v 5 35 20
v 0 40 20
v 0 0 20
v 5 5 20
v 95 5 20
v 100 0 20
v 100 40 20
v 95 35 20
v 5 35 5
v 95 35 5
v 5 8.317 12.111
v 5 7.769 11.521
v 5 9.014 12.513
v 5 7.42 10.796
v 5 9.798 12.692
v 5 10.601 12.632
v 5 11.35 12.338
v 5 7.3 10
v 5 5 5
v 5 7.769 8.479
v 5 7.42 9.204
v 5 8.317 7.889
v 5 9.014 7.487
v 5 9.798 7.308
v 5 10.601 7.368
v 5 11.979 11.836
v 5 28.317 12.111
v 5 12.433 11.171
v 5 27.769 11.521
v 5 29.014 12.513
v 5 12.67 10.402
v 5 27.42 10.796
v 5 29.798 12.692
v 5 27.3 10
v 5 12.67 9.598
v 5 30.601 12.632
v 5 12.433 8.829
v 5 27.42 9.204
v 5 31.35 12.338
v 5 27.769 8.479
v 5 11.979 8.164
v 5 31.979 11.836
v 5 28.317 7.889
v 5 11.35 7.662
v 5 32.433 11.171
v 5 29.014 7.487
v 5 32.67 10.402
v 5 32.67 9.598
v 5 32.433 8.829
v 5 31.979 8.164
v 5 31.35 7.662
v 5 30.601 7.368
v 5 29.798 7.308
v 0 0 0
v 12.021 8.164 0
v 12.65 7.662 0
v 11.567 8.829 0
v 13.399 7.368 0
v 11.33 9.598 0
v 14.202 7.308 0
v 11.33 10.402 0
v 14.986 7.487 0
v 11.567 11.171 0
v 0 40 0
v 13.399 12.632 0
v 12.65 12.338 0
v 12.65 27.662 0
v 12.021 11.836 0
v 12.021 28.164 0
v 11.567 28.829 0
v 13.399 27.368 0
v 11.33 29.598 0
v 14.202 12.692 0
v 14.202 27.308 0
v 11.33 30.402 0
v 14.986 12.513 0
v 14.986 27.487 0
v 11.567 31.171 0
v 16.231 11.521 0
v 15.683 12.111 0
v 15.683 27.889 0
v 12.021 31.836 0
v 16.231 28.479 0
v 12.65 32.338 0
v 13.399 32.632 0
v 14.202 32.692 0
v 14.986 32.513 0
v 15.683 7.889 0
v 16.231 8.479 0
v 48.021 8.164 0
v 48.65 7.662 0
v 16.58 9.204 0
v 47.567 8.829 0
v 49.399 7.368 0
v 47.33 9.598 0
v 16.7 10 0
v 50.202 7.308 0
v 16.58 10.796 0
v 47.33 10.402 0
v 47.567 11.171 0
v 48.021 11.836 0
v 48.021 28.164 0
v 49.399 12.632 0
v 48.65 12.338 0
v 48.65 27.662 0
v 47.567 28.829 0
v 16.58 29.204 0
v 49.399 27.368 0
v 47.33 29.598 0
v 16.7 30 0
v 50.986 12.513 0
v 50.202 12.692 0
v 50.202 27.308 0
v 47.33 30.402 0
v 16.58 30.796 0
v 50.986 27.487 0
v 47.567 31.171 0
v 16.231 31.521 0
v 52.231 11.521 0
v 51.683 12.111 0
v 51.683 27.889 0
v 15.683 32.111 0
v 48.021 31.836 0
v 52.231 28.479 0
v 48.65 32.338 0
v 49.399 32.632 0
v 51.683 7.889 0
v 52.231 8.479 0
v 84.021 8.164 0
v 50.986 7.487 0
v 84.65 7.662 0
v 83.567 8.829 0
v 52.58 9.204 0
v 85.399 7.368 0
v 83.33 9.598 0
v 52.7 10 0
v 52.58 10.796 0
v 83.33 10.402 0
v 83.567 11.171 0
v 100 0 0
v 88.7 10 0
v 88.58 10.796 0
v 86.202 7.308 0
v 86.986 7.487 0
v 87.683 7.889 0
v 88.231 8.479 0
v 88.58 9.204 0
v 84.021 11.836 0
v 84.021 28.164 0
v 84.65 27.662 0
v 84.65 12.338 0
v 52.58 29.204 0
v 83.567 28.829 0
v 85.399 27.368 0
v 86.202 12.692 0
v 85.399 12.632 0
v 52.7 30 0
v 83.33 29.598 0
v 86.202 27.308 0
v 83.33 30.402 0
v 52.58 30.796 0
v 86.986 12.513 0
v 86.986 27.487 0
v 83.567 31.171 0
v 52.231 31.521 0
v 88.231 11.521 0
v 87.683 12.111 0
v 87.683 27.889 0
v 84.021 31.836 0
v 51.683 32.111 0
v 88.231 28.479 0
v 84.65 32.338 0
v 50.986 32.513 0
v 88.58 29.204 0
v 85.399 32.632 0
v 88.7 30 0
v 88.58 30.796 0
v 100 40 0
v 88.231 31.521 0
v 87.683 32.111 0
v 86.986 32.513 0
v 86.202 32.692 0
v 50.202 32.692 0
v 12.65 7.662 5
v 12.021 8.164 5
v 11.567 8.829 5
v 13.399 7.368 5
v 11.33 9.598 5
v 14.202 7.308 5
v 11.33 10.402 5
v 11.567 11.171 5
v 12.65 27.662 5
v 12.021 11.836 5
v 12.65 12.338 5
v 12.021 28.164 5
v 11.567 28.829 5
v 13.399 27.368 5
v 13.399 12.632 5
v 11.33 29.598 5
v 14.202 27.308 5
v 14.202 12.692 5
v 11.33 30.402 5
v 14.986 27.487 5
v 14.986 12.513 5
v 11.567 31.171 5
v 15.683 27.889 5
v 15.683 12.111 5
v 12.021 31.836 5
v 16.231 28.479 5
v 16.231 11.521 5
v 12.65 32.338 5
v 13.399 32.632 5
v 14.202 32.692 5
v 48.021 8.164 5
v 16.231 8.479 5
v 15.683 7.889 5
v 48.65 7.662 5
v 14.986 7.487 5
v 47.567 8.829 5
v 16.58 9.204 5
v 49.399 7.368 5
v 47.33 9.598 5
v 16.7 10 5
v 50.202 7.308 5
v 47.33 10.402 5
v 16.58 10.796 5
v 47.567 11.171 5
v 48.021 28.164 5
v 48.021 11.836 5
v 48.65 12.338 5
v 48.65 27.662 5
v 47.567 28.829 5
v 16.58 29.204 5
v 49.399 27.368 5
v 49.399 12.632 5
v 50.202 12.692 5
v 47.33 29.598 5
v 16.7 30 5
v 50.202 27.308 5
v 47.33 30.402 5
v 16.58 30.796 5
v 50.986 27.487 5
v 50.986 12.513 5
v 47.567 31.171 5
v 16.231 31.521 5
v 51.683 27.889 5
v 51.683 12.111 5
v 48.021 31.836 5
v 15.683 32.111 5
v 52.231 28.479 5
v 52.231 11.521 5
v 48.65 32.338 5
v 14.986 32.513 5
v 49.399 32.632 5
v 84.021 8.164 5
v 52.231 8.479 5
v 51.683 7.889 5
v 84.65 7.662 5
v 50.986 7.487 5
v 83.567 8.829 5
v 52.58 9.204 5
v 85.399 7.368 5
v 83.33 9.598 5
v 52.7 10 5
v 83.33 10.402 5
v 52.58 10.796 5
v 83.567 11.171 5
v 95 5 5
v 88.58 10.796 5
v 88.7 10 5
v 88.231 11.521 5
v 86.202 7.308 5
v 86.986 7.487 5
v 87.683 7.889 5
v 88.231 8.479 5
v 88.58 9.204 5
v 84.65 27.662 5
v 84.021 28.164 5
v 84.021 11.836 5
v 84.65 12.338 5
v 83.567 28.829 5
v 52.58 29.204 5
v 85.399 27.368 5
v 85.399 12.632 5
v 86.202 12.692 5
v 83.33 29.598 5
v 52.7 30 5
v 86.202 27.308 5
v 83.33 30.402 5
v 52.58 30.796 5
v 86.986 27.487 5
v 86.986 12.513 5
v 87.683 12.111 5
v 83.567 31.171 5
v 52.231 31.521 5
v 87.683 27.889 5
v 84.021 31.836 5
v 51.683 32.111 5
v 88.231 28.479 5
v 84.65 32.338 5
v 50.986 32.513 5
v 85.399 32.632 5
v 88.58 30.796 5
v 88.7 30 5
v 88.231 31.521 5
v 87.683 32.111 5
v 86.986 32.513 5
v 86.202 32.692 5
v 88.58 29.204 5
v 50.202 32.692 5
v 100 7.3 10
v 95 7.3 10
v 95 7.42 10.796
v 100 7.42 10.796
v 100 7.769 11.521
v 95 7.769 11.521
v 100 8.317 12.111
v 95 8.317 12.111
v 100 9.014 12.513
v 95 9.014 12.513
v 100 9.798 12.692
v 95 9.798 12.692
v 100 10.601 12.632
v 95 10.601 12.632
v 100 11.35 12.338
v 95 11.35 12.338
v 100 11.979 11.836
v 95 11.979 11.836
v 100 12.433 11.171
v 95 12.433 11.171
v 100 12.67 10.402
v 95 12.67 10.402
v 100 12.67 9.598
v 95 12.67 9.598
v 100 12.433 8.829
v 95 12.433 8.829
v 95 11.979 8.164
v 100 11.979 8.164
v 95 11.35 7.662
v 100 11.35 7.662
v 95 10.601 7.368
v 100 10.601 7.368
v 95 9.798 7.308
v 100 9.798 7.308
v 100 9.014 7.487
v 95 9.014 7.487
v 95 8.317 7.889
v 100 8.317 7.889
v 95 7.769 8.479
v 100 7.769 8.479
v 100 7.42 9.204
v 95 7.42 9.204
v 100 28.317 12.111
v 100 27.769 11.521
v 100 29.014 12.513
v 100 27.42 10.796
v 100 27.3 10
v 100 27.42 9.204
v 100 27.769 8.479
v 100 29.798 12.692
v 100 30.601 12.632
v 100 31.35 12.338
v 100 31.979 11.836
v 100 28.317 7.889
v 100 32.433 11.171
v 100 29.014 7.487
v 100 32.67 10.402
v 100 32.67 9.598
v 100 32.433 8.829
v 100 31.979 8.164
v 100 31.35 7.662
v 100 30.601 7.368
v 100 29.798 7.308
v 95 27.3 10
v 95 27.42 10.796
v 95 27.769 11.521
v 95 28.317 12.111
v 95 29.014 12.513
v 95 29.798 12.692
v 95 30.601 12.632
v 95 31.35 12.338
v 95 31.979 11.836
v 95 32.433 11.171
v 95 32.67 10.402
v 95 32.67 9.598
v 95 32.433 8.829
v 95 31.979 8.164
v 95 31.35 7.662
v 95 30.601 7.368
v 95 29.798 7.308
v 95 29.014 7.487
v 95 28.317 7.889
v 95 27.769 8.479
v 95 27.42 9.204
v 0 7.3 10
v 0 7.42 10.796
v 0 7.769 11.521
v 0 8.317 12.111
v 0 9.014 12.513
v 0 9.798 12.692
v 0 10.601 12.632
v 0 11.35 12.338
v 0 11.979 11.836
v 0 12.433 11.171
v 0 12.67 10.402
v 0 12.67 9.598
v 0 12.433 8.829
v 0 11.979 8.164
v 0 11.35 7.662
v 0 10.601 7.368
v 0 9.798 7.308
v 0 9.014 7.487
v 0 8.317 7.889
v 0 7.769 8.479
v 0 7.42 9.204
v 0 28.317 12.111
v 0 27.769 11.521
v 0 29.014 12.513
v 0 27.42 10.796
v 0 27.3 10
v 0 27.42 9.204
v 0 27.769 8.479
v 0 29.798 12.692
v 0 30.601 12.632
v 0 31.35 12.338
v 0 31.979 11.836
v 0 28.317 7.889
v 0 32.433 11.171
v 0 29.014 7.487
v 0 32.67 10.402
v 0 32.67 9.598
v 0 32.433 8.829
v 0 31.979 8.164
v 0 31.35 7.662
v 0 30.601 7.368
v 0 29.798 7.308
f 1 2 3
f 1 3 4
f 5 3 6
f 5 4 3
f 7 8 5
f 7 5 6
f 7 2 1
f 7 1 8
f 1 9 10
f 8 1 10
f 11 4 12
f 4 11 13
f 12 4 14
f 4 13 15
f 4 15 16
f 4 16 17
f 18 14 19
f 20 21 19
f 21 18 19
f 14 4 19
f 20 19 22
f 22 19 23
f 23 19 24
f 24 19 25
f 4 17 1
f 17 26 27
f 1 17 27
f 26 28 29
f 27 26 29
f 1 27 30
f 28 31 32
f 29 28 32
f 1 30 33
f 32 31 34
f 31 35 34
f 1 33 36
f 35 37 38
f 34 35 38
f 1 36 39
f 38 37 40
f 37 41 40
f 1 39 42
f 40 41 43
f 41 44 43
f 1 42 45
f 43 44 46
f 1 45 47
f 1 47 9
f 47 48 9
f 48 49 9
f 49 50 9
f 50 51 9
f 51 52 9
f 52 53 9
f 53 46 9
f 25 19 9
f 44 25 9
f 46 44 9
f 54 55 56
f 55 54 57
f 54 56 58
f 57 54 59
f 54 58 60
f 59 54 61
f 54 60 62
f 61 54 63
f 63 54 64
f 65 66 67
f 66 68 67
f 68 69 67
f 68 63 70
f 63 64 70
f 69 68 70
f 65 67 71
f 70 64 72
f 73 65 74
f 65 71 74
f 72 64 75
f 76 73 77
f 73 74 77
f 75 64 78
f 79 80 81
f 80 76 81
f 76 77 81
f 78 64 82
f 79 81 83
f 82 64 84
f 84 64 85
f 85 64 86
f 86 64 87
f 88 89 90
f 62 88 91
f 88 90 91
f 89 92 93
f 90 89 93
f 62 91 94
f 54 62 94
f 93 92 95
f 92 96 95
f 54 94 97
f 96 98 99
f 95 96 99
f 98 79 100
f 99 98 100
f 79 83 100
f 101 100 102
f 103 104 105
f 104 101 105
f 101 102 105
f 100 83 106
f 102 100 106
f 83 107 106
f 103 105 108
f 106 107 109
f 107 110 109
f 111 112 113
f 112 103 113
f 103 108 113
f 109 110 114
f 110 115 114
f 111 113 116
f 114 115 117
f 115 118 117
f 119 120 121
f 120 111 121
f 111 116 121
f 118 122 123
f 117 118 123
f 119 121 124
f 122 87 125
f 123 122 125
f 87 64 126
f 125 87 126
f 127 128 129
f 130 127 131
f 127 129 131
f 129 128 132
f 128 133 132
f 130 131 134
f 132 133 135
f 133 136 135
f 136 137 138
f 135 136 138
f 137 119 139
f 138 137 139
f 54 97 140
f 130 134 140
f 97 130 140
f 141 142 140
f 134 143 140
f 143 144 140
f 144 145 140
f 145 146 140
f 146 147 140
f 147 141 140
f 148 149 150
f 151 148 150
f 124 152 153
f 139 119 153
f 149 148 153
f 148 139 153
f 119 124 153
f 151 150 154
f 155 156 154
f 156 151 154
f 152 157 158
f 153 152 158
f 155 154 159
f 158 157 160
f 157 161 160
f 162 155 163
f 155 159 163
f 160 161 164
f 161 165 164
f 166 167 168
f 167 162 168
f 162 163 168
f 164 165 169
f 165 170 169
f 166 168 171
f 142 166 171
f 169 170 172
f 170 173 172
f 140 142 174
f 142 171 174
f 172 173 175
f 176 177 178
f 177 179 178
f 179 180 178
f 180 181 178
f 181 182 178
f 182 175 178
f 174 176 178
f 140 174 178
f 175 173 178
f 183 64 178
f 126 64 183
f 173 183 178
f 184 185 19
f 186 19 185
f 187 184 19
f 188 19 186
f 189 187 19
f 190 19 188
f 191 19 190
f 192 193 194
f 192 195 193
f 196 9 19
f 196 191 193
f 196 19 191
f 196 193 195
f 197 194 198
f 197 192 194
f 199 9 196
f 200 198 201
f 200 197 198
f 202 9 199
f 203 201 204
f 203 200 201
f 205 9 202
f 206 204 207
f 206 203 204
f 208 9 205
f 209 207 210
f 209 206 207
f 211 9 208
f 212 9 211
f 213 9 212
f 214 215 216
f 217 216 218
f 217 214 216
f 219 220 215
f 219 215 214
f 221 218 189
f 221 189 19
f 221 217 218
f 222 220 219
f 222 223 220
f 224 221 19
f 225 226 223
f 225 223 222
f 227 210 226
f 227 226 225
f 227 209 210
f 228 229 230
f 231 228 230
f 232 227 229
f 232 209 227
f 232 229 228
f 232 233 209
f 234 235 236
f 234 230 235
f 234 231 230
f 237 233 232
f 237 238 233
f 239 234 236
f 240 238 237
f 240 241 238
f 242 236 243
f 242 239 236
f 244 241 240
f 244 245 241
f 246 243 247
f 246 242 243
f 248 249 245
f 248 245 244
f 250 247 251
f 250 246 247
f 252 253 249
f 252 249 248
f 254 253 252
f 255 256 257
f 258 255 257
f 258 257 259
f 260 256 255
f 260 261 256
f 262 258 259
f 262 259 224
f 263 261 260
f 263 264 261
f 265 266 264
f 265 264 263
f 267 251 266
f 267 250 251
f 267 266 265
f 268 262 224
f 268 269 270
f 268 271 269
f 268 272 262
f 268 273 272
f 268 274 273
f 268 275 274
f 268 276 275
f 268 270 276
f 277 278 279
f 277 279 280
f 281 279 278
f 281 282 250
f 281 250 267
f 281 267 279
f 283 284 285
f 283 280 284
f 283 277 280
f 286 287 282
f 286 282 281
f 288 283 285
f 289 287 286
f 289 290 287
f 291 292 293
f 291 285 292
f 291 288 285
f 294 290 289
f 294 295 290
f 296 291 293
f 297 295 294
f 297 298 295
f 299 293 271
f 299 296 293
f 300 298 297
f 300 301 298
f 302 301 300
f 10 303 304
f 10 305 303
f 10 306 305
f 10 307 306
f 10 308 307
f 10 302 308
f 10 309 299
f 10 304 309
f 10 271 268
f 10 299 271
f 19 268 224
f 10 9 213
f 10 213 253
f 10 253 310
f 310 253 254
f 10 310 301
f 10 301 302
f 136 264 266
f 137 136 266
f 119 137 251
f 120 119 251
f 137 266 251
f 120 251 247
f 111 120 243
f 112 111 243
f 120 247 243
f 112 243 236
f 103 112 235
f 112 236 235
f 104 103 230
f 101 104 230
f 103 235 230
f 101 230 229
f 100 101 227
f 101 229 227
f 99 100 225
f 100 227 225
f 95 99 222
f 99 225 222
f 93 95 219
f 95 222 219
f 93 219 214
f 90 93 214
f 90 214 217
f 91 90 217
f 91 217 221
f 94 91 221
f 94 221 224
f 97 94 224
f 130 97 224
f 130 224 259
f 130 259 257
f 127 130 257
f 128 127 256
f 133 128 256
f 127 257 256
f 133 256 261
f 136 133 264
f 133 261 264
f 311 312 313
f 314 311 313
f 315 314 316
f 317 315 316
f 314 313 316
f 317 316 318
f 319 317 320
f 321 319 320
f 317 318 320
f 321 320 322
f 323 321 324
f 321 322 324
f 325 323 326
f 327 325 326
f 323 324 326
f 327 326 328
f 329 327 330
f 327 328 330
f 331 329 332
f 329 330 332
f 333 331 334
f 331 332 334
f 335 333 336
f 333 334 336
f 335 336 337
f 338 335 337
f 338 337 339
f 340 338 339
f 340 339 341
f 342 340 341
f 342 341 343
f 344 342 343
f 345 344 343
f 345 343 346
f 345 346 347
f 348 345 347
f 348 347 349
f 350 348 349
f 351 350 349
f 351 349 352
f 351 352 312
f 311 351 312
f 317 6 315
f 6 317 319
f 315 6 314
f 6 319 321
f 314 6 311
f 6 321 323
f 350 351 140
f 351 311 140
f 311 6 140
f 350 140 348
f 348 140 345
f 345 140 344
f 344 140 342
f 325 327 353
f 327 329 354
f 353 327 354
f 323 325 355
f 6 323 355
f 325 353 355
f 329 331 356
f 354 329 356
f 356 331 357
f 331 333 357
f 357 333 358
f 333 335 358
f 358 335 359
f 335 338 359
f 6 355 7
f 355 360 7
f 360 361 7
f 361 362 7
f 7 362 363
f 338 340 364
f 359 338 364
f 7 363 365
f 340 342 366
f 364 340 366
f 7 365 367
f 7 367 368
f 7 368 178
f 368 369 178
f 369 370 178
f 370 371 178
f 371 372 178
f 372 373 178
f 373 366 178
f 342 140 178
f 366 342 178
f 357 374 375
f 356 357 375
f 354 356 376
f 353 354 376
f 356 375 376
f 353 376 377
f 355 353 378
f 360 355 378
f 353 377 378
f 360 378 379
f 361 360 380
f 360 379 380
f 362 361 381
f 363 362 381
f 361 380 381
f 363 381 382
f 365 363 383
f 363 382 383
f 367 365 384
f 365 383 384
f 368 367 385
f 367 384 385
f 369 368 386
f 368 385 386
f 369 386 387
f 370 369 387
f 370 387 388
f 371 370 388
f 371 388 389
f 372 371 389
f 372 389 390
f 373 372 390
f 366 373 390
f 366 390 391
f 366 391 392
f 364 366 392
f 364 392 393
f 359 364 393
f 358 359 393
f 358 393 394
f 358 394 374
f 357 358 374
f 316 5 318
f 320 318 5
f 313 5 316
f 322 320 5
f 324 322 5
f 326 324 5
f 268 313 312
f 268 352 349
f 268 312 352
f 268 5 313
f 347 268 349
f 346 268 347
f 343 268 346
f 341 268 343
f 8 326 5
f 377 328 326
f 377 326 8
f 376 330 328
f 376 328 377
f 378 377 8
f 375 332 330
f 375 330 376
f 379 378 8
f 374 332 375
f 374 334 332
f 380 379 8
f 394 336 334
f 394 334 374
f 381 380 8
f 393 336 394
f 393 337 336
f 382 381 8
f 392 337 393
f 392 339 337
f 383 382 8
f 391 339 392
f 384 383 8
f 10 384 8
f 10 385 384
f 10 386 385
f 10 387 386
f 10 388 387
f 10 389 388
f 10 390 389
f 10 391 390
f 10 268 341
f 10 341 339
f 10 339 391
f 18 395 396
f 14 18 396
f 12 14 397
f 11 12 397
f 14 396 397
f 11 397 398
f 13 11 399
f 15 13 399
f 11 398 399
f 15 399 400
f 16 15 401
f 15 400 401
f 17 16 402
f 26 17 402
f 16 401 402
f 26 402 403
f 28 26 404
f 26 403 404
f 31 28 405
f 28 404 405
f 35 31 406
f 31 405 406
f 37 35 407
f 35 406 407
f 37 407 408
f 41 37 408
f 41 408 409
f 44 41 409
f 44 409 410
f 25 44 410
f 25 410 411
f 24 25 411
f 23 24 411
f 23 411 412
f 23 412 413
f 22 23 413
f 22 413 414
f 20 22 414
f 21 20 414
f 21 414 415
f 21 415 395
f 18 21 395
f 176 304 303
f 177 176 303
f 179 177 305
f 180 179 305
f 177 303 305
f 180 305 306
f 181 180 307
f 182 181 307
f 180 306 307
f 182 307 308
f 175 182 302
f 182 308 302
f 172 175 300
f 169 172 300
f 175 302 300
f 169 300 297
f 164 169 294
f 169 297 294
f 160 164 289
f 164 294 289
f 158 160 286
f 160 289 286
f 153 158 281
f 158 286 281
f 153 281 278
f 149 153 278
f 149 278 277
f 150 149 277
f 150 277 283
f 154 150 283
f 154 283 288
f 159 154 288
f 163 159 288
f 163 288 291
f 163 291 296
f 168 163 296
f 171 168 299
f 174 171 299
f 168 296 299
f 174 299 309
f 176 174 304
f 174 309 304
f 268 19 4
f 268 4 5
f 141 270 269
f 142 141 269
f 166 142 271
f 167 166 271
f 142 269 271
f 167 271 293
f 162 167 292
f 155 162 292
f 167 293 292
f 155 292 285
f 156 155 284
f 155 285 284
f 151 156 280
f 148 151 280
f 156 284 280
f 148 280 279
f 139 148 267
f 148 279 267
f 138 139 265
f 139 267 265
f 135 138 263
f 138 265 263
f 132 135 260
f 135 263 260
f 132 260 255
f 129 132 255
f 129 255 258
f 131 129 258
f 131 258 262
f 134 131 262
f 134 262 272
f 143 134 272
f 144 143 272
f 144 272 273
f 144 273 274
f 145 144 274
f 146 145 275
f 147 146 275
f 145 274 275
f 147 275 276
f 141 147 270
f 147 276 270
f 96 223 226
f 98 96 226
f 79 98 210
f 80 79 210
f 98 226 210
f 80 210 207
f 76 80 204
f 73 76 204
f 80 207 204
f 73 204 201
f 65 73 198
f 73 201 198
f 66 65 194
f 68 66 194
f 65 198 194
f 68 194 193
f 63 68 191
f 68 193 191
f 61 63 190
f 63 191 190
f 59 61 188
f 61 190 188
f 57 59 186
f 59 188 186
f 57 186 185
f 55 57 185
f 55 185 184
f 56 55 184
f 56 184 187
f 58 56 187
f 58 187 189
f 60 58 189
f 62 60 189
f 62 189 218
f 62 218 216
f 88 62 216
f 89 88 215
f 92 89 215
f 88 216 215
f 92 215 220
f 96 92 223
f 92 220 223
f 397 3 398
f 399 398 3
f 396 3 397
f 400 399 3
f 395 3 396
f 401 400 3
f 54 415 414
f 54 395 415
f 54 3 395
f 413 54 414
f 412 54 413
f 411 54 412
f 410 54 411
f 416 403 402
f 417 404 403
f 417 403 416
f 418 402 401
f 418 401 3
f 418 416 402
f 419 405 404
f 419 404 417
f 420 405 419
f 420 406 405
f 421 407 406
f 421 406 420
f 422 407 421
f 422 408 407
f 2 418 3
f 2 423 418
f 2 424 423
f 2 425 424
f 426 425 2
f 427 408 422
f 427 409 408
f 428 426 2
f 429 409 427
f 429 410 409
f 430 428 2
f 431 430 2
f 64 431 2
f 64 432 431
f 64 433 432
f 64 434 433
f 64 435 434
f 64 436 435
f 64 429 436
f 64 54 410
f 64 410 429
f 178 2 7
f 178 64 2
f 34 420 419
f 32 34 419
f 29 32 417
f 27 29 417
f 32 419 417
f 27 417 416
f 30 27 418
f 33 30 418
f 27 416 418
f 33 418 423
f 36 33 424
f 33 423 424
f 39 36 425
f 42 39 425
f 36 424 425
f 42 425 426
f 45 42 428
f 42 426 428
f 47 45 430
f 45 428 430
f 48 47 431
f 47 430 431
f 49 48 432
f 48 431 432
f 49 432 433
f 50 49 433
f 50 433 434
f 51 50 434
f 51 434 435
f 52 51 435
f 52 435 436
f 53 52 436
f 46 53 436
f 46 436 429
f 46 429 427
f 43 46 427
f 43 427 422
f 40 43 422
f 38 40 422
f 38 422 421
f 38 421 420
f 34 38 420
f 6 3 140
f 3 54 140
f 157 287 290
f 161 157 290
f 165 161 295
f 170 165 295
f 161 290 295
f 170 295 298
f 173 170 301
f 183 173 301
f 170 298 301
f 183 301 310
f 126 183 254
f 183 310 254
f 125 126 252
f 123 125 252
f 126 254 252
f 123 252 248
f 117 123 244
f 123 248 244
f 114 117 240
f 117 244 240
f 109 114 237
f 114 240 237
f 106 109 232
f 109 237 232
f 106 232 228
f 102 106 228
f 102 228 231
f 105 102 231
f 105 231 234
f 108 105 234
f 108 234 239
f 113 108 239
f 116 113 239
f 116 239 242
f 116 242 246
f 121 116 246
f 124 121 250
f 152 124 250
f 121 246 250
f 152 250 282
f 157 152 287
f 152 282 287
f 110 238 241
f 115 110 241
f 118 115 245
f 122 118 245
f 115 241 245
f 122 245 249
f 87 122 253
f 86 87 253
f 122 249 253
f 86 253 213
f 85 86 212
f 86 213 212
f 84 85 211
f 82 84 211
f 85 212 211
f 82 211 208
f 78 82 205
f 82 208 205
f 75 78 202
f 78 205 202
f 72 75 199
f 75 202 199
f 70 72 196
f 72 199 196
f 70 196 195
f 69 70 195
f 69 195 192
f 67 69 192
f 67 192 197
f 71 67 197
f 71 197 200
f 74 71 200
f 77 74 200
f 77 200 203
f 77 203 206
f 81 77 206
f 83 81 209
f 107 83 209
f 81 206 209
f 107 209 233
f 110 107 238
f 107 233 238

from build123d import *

# Parameters (mm, degrees)
SKETCH079_W     = 100
SKETCH079_H     = 40
PAD064_DEPTH    = 5
SKETCH080_W     = 5
SKETCH080_H     = 40
PAD065_DEPTH    = 15
SKETCH081_R     = 2.7
POCKET019_DEPTH = 100.001
SKETCH082_R     = 2.7
POCKET020_DEPTH = 5
SKETCH089_W     = 90
SKETCH089_H     = 5
PAD072_DEPTH    = 15


with BuildPart() as part:
    # Sketch079 → Pad064 (new body)
    with BuildSketch(Plane.XY):
        with Locations((50, 20)):
            Rectangle(SKETCH079_W, SKETCH079_H)
    extrude(amount=PAD064_DEPTH)

    # Sketch080 (on Face6 of Pad064) → Pad065 (join)
    with BuildSketch(Plane.XY.offset(5)):
        with Locations((2.5, 20)):
            Rectangle(SKETCH080_W, SKETCH080_H)
        with Locations((97.5, 20)):
            Rectangle(SKETCH080_W, SKETCH080_H)
    extrude(amount=PAD065_DEPTH)

    # Sketch081 (on Face5 of Pad065) → Pocket019 (cut, through all)
    with BuildSketch(Plane(origin=(0, 0, 0), x_dir=(0, -1, 0), z_dir=(-1, 0, 0))):
        with Locations((-30, 10)):
            Circle(SKETCH081_R)
        with Locations((-10, 10)):
            Circle(SKETCH081_R)
    extrude(amount=-POCKET019_DEPTH, mode=Mode.SUBTRACT)

    # Sketch082 (on Face8 of Pocket019) → Pocket020 (cut)
    with BuildSketch(Plane.XY.offset(5)):
        with Locations((14, 30)):
            Circle(SKETCH082_R)
        with Locations((14, 10)):
            Circle(SKETCH082_R)
        with Locations((86, 30)):
            Circle(SKETCH082_R)
        with Locations((86, 10)):
            Circle(SKETCH082_R)
        with Locations((50, 30)):
            Circle(SKETCH082_R)
        with Locations((50, 10)):
            Circle(SKETCH082_R)
    extrude(amount=-POCKET020_DEPTH, mode=Mode.SUBTRACT)

    # Sketch089 (on Face8 of Pocket020) → Pad072 (join)
    with BuildSketch(Plane.XY.offset(5)):
        with Locations((50, 37.5)):
            Rectangle(SKETCH089_W, SKETCH089_H)
        with Locations((50, 2.5)):
            Rectangle(SKETCH089_W, SKETCH089_H)
    extrude(amount=PAD072_DEPTH)


solid = part.part
